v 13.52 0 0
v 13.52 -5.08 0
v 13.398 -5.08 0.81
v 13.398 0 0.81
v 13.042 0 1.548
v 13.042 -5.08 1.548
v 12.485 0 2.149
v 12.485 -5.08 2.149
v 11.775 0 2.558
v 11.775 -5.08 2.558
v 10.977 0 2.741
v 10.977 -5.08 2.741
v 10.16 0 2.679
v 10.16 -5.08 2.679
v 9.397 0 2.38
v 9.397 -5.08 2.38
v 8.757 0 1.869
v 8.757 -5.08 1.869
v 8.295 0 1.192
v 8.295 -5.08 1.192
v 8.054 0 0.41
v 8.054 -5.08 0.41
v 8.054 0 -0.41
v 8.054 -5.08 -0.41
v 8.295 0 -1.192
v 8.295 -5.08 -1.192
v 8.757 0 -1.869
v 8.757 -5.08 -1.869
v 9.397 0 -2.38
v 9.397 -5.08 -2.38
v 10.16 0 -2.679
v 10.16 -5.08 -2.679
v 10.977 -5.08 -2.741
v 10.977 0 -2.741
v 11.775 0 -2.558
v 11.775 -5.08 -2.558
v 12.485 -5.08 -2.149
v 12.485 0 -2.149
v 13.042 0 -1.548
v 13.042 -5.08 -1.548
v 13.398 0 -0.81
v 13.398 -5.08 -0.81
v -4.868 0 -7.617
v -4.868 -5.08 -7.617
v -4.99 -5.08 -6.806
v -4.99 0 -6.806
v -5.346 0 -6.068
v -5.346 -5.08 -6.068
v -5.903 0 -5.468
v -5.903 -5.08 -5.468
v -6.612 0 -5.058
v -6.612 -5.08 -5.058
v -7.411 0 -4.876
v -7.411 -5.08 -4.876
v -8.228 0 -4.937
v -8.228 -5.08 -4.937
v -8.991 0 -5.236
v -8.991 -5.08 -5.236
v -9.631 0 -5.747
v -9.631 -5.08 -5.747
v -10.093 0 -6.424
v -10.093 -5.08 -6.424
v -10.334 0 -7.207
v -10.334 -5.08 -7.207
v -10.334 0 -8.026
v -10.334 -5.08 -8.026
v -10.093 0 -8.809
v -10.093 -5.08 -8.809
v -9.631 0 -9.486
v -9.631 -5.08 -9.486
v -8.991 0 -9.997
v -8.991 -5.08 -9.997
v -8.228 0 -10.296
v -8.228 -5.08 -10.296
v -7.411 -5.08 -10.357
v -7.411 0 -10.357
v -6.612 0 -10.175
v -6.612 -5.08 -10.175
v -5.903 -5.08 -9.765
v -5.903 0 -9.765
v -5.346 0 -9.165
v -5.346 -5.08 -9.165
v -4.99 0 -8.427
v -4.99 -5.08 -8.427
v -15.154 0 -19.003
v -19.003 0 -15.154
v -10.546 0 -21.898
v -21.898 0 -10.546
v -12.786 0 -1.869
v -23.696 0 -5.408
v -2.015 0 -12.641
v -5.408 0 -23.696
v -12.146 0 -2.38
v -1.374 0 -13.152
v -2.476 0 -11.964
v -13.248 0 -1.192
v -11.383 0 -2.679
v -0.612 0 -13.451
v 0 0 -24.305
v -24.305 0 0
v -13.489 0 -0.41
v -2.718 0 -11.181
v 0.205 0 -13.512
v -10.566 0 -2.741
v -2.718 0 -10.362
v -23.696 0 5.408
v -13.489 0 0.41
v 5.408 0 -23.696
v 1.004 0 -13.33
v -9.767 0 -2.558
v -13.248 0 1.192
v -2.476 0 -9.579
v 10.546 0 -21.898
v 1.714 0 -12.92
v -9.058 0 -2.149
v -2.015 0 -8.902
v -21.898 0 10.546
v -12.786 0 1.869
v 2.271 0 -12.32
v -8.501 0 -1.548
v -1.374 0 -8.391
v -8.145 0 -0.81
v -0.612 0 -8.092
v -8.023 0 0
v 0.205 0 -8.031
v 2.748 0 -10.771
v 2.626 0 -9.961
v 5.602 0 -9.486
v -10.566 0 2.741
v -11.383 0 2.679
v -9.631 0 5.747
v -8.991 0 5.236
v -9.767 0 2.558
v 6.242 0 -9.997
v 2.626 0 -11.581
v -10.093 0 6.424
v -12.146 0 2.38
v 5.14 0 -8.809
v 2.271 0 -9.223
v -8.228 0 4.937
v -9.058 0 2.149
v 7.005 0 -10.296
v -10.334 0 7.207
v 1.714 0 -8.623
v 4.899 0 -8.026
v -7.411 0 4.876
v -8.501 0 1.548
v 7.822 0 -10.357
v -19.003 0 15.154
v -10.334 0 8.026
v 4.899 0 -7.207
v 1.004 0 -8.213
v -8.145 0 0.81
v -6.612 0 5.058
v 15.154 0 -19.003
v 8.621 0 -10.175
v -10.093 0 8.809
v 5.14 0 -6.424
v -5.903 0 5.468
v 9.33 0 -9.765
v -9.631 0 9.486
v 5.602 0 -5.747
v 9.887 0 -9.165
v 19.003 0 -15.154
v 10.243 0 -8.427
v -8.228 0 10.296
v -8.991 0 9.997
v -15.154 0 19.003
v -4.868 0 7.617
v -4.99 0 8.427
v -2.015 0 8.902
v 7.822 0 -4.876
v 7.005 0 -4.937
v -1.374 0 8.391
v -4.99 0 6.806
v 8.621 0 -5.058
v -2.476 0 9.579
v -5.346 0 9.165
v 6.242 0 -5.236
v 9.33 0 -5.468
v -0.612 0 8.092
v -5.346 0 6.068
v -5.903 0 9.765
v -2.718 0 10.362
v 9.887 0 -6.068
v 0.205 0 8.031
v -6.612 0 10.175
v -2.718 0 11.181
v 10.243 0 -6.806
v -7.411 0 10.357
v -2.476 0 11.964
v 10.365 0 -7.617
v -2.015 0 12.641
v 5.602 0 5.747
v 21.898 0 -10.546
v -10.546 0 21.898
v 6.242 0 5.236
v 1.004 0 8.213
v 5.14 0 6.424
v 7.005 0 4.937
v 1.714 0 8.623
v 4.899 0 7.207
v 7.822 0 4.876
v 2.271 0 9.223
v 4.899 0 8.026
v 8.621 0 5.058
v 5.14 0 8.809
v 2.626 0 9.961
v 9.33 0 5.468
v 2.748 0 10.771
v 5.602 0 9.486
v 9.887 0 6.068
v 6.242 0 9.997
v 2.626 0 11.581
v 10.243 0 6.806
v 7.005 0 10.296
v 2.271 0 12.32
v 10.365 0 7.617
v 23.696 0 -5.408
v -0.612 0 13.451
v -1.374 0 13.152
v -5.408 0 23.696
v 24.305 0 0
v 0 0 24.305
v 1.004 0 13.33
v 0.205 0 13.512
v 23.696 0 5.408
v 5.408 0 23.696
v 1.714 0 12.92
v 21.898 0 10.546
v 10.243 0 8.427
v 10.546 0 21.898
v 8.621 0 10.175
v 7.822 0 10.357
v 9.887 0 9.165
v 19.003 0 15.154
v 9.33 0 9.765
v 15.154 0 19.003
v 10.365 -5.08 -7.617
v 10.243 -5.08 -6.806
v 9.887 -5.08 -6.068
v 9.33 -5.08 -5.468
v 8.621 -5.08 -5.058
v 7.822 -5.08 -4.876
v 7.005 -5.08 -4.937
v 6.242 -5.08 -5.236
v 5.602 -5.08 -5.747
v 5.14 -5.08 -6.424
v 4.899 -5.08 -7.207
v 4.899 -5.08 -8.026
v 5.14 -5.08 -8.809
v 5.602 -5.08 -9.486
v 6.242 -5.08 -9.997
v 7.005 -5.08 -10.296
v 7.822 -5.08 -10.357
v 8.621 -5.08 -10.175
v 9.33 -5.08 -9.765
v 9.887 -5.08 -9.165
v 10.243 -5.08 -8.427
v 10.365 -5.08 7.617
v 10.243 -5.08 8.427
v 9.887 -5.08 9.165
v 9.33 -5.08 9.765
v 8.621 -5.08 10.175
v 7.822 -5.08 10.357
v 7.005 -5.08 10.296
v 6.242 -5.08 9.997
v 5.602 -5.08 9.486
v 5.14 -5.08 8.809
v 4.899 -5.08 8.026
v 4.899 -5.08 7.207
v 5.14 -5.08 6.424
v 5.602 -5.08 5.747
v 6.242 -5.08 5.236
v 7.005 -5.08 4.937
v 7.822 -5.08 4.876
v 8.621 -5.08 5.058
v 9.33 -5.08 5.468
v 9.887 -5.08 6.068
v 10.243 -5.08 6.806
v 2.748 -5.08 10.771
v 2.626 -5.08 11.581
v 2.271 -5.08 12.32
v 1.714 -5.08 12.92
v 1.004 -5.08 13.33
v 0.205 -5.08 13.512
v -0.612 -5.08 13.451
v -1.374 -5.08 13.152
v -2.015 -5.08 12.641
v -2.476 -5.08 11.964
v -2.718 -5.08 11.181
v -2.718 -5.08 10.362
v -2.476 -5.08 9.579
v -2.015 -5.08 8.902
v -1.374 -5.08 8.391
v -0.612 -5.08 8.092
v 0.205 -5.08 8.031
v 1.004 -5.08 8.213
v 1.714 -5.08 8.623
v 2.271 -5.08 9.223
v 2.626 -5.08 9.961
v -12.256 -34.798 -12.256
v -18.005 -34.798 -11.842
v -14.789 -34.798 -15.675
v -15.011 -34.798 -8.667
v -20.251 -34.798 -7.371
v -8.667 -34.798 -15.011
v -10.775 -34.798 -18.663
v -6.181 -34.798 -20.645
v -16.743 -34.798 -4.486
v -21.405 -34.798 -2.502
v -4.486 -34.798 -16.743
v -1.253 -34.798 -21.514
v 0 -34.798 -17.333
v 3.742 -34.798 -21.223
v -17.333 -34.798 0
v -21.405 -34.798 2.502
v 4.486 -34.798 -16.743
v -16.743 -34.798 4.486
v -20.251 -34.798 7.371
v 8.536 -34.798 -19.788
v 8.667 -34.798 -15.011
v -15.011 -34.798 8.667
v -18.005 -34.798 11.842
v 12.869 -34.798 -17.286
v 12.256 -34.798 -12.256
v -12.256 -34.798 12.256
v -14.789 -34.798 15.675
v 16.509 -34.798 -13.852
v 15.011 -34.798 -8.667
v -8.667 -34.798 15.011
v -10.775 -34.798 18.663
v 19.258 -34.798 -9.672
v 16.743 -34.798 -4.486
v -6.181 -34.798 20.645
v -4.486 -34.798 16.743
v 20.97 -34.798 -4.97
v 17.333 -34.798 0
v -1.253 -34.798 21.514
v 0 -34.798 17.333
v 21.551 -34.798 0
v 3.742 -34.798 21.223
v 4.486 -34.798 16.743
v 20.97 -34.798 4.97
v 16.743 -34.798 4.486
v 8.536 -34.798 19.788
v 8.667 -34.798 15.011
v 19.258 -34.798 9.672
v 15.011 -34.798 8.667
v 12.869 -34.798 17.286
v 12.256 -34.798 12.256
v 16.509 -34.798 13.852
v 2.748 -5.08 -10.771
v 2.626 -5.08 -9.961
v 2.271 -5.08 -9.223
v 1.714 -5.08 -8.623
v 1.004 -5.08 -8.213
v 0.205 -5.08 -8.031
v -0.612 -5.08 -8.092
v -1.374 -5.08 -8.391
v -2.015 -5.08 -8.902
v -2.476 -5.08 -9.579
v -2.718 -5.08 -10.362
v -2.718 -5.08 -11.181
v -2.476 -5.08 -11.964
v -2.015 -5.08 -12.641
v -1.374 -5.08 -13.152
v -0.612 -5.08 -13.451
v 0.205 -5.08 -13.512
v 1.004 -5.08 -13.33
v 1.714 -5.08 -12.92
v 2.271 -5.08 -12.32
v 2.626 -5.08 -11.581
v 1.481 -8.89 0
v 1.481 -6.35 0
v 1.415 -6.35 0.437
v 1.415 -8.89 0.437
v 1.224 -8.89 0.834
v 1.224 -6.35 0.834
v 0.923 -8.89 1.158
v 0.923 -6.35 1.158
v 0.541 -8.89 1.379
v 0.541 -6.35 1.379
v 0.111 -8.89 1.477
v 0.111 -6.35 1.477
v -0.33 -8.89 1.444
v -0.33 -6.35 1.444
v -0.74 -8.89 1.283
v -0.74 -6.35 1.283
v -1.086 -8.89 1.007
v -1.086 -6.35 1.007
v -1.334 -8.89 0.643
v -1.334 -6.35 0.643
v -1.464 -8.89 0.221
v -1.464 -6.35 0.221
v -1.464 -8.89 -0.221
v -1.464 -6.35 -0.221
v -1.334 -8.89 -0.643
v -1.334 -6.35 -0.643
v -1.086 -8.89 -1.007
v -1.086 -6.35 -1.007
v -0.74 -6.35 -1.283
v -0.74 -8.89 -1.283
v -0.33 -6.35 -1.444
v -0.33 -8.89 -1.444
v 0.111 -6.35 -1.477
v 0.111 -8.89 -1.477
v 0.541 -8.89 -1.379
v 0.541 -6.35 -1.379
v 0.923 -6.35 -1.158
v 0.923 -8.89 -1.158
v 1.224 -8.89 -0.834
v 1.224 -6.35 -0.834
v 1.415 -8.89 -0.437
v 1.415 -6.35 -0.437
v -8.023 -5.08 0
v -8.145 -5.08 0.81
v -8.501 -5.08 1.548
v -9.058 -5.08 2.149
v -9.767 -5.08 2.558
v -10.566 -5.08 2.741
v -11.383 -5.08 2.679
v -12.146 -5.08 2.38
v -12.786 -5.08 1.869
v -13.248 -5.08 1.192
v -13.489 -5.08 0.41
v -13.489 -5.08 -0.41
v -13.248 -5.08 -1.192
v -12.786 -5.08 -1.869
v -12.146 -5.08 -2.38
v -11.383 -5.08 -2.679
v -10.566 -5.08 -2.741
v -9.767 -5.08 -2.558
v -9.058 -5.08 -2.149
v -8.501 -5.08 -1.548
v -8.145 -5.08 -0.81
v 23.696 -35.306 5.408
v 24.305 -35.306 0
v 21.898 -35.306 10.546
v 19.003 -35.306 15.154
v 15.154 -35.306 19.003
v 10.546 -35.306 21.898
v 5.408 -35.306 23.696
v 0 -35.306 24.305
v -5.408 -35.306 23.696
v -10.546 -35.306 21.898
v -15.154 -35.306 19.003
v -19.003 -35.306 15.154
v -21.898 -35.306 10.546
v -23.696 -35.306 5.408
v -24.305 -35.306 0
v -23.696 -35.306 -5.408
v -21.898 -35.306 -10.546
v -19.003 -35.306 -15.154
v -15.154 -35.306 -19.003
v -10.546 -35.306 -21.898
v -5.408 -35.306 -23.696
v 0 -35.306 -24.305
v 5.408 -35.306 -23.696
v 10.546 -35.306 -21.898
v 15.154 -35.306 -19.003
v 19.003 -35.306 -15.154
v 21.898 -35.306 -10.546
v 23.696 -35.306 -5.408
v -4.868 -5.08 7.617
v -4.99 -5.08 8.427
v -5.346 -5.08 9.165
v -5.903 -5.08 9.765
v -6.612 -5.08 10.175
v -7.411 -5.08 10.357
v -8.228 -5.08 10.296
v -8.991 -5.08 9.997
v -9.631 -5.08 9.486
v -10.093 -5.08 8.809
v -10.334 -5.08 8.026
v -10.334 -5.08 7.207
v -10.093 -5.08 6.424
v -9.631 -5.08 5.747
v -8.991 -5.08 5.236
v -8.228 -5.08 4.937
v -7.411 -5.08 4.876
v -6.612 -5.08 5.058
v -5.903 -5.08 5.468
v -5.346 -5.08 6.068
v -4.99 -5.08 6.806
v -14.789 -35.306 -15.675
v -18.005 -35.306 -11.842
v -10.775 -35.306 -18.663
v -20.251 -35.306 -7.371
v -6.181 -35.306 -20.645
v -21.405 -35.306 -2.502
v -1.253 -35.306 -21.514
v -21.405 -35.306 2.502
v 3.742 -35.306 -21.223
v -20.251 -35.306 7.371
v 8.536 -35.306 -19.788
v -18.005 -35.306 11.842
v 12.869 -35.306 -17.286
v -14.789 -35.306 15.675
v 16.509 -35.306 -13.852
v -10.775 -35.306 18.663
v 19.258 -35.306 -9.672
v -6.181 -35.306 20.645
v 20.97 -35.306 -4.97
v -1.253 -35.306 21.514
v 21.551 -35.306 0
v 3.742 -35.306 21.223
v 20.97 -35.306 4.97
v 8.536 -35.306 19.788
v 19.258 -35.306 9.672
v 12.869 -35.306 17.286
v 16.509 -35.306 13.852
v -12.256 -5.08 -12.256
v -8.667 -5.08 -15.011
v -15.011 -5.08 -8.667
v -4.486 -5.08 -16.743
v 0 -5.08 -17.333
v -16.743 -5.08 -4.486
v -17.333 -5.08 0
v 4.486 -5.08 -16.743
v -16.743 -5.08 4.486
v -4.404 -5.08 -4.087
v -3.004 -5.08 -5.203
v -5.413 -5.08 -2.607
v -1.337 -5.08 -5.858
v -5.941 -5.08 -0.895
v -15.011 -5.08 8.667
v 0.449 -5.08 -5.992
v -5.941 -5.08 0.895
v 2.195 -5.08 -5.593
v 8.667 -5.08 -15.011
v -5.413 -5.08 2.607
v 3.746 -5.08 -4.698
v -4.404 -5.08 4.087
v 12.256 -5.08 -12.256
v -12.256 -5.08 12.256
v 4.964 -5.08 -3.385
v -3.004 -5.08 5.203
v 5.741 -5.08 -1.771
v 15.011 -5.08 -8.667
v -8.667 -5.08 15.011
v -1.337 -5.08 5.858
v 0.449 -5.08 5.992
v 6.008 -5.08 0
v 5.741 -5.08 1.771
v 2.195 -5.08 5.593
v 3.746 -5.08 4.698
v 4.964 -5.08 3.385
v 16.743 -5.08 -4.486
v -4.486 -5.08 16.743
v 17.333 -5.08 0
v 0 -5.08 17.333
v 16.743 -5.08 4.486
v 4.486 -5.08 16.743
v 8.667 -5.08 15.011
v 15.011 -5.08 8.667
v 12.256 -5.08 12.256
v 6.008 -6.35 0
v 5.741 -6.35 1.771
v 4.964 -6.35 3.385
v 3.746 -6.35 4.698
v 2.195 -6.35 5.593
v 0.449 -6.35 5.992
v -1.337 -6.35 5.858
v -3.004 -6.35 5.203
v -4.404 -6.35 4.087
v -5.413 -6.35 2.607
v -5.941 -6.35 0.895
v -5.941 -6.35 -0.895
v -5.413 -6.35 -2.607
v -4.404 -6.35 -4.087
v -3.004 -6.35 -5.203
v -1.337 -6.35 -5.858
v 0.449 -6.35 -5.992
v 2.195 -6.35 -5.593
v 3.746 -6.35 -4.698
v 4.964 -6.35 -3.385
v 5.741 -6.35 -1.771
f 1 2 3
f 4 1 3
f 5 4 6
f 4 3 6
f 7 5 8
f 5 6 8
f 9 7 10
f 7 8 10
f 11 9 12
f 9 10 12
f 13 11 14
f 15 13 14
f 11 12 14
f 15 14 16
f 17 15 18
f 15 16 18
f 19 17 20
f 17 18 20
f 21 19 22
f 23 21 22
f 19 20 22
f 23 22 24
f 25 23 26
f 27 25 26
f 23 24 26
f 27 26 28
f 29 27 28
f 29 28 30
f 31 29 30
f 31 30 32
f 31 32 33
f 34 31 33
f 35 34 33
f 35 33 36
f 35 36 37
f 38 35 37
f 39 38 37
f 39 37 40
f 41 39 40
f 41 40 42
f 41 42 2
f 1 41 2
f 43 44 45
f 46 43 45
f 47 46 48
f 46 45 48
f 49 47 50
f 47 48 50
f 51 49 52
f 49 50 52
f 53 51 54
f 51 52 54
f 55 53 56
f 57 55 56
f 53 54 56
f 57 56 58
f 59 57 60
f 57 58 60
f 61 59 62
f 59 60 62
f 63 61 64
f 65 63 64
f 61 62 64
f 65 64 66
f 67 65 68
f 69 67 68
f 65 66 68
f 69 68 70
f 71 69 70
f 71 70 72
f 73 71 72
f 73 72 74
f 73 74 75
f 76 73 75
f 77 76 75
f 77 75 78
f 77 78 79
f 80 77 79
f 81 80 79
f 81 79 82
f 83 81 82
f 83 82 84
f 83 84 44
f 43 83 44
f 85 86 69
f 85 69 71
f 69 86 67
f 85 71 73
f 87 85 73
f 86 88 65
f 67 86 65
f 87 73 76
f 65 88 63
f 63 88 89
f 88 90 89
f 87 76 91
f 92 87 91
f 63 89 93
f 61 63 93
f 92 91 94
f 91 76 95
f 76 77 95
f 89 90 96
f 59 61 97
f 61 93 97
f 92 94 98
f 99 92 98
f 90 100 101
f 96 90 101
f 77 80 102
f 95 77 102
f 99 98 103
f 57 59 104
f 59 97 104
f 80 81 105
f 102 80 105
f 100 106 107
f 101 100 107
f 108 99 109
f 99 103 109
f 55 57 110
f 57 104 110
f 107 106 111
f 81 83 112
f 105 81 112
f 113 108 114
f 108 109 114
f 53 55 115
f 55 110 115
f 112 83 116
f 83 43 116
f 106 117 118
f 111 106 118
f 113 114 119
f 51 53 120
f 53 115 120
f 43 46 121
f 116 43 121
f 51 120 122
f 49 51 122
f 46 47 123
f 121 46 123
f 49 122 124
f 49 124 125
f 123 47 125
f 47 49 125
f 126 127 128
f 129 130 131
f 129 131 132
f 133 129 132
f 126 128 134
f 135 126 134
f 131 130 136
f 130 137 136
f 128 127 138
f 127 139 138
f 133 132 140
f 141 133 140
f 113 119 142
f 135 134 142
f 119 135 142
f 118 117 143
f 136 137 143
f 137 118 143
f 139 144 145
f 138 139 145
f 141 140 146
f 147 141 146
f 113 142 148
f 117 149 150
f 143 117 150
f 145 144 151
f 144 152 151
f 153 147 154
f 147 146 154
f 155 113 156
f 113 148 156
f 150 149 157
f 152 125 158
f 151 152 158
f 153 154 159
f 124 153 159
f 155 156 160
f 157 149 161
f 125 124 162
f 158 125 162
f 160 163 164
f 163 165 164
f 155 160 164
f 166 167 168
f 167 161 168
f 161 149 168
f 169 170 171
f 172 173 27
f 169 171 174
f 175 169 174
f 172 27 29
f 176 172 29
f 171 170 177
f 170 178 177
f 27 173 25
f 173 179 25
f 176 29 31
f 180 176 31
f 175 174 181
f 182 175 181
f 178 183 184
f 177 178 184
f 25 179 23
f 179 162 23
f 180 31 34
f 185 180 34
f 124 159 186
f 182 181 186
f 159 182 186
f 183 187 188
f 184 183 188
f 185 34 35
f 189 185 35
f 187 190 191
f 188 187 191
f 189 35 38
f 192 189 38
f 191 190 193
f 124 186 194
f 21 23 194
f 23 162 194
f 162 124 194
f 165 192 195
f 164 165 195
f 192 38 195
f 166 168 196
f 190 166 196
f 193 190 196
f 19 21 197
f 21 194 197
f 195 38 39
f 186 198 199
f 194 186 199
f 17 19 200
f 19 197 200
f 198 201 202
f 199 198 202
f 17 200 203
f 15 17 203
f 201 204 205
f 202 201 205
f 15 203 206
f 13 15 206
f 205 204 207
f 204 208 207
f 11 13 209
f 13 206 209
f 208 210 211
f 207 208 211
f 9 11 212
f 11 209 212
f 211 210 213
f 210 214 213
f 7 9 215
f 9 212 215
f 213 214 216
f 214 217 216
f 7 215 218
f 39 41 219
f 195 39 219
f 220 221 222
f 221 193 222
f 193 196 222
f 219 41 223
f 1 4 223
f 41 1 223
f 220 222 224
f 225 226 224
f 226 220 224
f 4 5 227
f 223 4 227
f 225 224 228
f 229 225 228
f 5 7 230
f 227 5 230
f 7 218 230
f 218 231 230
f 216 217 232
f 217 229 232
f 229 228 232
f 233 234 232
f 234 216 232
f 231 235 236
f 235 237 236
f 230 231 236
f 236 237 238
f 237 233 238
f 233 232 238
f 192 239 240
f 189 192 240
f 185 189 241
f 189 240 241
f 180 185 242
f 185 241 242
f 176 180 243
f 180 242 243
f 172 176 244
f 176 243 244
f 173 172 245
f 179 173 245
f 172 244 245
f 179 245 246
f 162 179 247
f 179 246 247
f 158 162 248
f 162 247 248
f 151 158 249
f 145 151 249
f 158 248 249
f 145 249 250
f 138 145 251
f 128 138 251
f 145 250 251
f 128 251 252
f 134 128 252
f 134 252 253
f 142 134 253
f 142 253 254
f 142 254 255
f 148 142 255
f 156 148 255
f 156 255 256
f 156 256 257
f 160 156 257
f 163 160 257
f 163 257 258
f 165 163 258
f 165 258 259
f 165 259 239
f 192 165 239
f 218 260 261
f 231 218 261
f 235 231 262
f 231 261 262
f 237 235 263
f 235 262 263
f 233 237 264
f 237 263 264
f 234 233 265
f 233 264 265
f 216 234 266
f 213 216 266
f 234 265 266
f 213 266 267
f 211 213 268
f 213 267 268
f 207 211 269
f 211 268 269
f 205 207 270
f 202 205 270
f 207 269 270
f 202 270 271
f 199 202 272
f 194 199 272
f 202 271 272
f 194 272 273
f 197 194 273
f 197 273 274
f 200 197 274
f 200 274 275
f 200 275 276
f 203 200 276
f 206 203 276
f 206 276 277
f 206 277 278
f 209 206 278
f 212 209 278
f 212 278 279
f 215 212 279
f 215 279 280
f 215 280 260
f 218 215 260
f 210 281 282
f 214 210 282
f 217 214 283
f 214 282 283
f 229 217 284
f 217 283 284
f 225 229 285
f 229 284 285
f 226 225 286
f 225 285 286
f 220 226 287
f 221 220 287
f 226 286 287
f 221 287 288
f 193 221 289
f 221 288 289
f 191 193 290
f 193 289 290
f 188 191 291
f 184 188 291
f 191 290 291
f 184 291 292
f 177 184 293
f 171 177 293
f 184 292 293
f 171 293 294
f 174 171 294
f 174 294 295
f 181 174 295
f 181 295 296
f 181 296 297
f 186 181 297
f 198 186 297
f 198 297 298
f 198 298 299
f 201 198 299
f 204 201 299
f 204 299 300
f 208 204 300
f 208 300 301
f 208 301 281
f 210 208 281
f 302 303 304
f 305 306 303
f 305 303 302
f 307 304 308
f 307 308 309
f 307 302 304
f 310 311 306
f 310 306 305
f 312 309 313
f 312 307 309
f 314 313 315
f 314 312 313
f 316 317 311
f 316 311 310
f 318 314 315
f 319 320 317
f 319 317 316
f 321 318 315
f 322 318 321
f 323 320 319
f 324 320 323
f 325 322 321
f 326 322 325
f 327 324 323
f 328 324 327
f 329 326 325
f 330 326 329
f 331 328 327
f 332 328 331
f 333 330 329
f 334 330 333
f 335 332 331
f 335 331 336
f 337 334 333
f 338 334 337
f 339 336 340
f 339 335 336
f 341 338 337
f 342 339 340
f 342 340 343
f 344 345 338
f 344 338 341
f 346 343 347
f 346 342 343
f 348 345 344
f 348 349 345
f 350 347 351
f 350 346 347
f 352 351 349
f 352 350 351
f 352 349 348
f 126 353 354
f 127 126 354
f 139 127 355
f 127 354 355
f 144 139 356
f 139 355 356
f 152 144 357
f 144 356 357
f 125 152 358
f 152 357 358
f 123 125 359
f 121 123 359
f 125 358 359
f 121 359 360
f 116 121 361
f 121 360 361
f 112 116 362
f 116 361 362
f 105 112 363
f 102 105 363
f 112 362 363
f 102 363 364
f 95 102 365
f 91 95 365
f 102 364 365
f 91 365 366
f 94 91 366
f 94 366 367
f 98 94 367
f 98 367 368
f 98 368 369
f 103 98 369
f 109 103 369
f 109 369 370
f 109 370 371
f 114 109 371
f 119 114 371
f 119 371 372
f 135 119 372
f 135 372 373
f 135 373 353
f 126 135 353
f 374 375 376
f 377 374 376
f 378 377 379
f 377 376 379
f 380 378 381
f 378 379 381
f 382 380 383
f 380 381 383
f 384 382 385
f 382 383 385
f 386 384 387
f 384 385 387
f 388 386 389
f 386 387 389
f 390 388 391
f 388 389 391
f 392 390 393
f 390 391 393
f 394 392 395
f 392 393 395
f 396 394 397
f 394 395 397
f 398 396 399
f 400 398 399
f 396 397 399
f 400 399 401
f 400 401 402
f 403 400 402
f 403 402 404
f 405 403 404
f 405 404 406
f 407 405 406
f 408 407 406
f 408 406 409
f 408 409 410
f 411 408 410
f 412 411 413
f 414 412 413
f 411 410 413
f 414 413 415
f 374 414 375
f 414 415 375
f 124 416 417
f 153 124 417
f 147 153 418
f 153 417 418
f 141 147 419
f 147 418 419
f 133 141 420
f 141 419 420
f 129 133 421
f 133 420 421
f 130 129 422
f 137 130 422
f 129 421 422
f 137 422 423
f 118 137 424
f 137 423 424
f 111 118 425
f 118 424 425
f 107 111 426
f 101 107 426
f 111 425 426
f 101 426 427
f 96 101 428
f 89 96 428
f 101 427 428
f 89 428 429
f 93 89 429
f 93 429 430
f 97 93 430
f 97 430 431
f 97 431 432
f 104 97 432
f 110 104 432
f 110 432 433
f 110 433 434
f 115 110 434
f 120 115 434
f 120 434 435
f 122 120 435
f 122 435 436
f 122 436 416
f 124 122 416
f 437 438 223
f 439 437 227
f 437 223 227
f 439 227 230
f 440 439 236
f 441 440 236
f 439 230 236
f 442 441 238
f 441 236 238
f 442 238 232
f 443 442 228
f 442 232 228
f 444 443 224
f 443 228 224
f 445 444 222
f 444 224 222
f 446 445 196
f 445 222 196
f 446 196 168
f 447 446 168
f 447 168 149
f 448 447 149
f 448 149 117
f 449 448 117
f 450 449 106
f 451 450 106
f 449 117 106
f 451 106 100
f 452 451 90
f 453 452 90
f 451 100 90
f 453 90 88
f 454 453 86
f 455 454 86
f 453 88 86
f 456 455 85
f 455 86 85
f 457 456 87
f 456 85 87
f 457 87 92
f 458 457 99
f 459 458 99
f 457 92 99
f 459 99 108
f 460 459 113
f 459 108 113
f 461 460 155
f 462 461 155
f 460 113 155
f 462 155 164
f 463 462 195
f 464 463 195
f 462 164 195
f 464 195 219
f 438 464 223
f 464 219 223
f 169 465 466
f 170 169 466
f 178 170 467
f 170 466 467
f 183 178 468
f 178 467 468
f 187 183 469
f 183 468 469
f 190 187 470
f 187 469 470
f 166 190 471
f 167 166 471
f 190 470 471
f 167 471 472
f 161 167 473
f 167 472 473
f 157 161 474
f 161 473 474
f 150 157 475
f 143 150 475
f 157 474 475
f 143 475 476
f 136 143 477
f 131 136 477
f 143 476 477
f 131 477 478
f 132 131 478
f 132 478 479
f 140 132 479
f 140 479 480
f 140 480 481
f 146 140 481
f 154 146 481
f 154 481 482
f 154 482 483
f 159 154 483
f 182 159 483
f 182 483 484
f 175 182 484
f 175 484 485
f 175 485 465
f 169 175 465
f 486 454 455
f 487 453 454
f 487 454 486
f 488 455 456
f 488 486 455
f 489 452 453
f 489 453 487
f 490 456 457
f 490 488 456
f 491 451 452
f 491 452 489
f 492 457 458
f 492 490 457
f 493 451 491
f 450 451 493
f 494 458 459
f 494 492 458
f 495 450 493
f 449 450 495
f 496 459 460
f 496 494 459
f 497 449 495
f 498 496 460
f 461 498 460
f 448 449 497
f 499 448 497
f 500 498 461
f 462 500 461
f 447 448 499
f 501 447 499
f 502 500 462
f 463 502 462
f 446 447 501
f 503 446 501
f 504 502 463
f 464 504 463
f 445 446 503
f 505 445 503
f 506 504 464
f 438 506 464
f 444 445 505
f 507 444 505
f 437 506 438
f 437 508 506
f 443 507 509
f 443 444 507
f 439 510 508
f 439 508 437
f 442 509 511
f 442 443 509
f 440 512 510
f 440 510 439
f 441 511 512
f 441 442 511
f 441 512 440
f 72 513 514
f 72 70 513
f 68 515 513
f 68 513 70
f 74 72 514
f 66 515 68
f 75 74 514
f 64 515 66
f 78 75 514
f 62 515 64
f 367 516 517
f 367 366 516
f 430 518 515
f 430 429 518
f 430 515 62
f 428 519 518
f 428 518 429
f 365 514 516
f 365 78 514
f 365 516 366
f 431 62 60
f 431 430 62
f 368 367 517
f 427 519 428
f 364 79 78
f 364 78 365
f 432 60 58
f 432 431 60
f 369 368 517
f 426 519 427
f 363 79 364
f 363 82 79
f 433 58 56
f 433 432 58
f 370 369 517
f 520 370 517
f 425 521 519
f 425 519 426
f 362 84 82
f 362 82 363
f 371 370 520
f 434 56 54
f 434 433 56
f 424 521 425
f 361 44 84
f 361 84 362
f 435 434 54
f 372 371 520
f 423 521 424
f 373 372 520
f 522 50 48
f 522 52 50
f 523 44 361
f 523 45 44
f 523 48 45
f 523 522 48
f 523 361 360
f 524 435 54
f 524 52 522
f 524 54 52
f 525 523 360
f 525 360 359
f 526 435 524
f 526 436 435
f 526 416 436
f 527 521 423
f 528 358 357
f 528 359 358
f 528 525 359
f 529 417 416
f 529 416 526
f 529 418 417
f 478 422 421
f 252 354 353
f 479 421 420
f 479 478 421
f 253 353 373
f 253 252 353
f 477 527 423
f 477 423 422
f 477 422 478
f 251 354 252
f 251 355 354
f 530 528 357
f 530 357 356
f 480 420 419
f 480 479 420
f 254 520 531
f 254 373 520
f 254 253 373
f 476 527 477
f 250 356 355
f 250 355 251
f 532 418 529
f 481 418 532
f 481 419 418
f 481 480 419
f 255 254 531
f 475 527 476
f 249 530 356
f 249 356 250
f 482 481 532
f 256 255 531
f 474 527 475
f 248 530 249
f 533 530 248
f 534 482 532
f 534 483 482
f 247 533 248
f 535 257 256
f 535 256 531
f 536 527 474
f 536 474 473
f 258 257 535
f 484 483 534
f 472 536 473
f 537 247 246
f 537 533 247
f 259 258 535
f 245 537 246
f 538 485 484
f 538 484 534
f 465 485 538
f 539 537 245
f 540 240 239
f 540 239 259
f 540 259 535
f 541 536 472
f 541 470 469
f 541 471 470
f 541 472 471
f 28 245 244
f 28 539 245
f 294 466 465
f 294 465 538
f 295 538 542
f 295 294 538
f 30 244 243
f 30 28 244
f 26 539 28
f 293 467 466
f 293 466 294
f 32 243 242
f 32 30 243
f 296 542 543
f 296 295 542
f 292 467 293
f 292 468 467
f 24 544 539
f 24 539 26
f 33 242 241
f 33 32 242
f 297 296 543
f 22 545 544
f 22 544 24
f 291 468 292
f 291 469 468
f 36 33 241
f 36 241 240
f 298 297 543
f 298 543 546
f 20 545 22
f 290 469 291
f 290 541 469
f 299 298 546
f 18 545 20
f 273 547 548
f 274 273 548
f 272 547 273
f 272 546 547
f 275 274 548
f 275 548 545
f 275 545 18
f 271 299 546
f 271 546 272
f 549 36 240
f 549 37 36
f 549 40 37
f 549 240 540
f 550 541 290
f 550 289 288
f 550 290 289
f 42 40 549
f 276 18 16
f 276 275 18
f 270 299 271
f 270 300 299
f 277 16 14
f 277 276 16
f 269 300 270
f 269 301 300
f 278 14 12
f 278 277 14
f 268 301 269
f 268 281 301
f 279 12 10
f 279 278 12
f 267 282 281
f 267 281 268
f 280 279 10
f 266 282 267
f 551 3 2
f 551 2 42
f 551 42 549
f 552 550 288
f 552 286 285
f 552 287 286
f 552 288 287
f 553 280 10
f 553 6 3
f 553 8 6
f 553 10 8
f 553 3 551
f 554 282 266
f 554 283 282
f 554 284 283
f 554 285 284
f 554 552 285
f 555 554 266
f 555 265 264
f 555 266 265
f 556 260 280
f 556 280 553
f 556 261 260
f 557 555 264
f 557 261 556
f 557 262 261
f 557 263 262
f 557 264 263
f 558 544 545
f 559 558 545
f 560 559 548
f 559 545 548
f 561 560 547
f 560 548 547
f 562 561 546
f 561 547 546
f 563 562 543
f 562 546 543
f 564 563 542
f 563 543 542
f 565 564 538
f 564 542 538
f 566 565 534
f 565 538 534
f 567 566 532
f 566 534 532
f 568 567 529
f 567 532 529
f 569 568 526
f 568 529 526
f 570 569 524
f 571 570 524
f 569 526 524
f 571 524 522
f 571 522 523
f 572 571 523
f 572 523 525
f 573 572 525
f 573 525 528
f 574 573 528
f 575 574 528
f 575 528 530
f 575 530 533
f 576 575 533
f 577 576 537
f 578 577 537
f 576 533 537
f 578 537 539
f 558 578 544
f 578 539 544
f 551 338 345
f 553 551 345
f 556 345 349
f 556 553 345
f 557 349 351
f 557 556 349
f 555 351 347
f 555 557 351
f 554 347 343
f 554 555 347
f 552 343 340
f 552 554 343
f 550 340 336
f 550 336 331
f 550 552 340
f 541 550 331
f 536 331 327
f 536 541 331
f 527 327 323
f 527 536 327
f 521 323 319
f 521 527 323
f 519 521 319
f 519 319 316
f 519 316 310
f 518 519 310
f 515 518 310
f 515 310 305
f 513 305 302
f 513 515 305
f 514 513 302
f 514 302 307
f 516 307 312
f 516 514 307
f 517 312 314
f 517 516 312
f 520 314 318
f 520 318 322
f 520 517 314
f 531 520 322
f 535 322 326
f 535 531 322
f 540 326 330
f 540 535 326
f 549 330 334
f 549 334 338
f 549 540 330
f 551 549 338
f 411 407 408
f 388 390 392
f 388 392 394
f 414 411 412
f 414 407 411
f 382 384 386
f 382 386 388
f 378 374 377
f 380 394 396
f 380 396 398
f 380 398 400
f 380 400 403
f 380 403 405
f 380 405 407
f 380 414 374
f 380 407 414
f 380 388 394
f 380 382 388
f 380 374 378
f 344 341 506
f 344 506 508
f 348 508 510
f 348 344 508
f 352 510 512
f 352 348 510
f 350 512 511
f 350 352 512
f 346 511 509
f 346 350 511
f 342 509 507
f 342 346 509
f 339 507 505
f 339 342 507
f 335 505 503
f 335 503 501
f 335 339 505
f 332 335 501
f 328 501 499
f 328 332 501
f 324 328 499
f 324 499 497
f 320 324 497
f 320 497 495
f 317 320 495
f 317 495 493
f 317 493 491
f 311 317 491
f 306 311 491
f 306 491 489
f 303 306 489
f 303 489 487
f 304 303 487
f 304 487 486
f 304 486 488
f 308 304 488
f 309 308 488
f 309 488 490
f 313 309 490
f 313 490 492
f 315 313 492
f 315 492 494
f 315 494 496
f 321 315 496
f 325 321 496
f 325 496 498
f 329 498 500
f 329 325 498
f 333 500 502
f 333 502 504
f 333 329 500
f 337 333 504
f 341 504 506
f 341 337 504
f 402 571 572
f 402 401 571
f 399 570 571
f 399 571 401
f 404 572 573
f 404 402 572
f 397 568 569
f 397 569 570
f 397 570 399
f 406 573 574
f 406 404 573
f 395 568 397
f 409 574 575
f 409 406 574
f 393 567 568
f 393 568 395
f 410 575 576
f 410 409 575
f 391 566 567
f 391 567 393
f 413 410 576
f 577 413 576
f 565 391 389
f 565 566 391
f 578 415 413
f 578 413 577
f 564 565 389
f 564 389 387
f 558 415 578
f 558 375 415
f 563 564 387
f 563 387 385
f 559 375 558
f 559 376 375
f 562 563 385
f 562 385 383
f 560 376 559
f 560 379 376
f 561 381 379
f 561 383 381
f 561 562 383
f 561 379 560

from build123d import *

# Parameters (mm, degrees)
F0_R      = 24.3051606916
F1_DEPTH  = 5.08
F2_R      = 24.3051606916
F2_R_2    = 21.5505163445
F5_DEPTH  = 2.286
F4_R      = 21.5505163445
F4_R_2    = 17.3332692352
F6_DEPTH  = 1.778
F3_R      = 6.0083606655
F7_DEPTH  = 1.27
F8_R      = 1.4809931101
F9_DEPTH  = 2.54
F10_R     = 2.7483891527
F11_DEPTH = 25.4
F12_DEPTH = 27.94


with BuildPart() as f1:
    # F0 (on Front) → F1 (new body)
    with BuildSketch(Plane.XZ):
        Circle(F0_R)
    extrude(amount=F1_DEPTH)

    # F2 (on face) → F5 (join)
    with BuildSketch(Plane.XZ.offset(5.08)):
        Circle(F2_R)
        Circle(F2_R_2, mode=Mode.SUBTRACT)
    extrude(amount=F5_DEPTH)

    # F4 (on face) → F6 (join)
    with BuildSketch(Plane.XZ.offset(5.08)):
        Circle(F4_R)
        Circle(F4_R_2, mode=Mode.SUBTRACT)
    extrude(amount=F6_DEPTH)

    # F3 (on face) → F7 (join)
    with BuildSketch(Plane.XZ.offset(5.08)):
        Circle(F3_R)
    extrude(amount=F7_DEPTH)

    # F8 (on face) → F9 (join)
    with BuildSketch(Plane.XZ.offset(6.35)):
        Circle(F8_R)
    extrude(amount=F9_DEPTH)

    # F10 (on face) → F11 (cut)
    with BuildSketch(Plane.XZ.offset(5.08)):
        with Locations((0, 10.771388188)):
            Circle(F10_R)
        with Locations((7.6165216305, 7.6165216305)):
            Circle(F10_R)
        with Locations((10.771388188, 0)):
            Circle(F10_R)
        with Locations((7.6165216305, -7.6165216305)):
            Circle(F10_R)
        with Locations((0, -10.771388188)):
            Circle(F10_R)
        with Locations((-7.6165216305, -7.6165216305)):
            Circle(F10_R)
        with Locations((-10.771388188, 0)):
            Circle(F10_R)
        with Locations((-7.6165216305, 7.6165216305)):
            Circle(F10_R)
    extrude(amount=-F11_DEPTH, mode=Mode.SUBTRACT)

    # F12 (add): faces of the model
    f12_faces = [f1.faces().sort_by_distance(p)[0] for p in [
        (-20.9409756947, -6.858, 0),
        (-23.6177069339, -7.366, 0),
    ]]
    extrude(f12_faces, amount=F12_DEPTH)


solid = f1.part
